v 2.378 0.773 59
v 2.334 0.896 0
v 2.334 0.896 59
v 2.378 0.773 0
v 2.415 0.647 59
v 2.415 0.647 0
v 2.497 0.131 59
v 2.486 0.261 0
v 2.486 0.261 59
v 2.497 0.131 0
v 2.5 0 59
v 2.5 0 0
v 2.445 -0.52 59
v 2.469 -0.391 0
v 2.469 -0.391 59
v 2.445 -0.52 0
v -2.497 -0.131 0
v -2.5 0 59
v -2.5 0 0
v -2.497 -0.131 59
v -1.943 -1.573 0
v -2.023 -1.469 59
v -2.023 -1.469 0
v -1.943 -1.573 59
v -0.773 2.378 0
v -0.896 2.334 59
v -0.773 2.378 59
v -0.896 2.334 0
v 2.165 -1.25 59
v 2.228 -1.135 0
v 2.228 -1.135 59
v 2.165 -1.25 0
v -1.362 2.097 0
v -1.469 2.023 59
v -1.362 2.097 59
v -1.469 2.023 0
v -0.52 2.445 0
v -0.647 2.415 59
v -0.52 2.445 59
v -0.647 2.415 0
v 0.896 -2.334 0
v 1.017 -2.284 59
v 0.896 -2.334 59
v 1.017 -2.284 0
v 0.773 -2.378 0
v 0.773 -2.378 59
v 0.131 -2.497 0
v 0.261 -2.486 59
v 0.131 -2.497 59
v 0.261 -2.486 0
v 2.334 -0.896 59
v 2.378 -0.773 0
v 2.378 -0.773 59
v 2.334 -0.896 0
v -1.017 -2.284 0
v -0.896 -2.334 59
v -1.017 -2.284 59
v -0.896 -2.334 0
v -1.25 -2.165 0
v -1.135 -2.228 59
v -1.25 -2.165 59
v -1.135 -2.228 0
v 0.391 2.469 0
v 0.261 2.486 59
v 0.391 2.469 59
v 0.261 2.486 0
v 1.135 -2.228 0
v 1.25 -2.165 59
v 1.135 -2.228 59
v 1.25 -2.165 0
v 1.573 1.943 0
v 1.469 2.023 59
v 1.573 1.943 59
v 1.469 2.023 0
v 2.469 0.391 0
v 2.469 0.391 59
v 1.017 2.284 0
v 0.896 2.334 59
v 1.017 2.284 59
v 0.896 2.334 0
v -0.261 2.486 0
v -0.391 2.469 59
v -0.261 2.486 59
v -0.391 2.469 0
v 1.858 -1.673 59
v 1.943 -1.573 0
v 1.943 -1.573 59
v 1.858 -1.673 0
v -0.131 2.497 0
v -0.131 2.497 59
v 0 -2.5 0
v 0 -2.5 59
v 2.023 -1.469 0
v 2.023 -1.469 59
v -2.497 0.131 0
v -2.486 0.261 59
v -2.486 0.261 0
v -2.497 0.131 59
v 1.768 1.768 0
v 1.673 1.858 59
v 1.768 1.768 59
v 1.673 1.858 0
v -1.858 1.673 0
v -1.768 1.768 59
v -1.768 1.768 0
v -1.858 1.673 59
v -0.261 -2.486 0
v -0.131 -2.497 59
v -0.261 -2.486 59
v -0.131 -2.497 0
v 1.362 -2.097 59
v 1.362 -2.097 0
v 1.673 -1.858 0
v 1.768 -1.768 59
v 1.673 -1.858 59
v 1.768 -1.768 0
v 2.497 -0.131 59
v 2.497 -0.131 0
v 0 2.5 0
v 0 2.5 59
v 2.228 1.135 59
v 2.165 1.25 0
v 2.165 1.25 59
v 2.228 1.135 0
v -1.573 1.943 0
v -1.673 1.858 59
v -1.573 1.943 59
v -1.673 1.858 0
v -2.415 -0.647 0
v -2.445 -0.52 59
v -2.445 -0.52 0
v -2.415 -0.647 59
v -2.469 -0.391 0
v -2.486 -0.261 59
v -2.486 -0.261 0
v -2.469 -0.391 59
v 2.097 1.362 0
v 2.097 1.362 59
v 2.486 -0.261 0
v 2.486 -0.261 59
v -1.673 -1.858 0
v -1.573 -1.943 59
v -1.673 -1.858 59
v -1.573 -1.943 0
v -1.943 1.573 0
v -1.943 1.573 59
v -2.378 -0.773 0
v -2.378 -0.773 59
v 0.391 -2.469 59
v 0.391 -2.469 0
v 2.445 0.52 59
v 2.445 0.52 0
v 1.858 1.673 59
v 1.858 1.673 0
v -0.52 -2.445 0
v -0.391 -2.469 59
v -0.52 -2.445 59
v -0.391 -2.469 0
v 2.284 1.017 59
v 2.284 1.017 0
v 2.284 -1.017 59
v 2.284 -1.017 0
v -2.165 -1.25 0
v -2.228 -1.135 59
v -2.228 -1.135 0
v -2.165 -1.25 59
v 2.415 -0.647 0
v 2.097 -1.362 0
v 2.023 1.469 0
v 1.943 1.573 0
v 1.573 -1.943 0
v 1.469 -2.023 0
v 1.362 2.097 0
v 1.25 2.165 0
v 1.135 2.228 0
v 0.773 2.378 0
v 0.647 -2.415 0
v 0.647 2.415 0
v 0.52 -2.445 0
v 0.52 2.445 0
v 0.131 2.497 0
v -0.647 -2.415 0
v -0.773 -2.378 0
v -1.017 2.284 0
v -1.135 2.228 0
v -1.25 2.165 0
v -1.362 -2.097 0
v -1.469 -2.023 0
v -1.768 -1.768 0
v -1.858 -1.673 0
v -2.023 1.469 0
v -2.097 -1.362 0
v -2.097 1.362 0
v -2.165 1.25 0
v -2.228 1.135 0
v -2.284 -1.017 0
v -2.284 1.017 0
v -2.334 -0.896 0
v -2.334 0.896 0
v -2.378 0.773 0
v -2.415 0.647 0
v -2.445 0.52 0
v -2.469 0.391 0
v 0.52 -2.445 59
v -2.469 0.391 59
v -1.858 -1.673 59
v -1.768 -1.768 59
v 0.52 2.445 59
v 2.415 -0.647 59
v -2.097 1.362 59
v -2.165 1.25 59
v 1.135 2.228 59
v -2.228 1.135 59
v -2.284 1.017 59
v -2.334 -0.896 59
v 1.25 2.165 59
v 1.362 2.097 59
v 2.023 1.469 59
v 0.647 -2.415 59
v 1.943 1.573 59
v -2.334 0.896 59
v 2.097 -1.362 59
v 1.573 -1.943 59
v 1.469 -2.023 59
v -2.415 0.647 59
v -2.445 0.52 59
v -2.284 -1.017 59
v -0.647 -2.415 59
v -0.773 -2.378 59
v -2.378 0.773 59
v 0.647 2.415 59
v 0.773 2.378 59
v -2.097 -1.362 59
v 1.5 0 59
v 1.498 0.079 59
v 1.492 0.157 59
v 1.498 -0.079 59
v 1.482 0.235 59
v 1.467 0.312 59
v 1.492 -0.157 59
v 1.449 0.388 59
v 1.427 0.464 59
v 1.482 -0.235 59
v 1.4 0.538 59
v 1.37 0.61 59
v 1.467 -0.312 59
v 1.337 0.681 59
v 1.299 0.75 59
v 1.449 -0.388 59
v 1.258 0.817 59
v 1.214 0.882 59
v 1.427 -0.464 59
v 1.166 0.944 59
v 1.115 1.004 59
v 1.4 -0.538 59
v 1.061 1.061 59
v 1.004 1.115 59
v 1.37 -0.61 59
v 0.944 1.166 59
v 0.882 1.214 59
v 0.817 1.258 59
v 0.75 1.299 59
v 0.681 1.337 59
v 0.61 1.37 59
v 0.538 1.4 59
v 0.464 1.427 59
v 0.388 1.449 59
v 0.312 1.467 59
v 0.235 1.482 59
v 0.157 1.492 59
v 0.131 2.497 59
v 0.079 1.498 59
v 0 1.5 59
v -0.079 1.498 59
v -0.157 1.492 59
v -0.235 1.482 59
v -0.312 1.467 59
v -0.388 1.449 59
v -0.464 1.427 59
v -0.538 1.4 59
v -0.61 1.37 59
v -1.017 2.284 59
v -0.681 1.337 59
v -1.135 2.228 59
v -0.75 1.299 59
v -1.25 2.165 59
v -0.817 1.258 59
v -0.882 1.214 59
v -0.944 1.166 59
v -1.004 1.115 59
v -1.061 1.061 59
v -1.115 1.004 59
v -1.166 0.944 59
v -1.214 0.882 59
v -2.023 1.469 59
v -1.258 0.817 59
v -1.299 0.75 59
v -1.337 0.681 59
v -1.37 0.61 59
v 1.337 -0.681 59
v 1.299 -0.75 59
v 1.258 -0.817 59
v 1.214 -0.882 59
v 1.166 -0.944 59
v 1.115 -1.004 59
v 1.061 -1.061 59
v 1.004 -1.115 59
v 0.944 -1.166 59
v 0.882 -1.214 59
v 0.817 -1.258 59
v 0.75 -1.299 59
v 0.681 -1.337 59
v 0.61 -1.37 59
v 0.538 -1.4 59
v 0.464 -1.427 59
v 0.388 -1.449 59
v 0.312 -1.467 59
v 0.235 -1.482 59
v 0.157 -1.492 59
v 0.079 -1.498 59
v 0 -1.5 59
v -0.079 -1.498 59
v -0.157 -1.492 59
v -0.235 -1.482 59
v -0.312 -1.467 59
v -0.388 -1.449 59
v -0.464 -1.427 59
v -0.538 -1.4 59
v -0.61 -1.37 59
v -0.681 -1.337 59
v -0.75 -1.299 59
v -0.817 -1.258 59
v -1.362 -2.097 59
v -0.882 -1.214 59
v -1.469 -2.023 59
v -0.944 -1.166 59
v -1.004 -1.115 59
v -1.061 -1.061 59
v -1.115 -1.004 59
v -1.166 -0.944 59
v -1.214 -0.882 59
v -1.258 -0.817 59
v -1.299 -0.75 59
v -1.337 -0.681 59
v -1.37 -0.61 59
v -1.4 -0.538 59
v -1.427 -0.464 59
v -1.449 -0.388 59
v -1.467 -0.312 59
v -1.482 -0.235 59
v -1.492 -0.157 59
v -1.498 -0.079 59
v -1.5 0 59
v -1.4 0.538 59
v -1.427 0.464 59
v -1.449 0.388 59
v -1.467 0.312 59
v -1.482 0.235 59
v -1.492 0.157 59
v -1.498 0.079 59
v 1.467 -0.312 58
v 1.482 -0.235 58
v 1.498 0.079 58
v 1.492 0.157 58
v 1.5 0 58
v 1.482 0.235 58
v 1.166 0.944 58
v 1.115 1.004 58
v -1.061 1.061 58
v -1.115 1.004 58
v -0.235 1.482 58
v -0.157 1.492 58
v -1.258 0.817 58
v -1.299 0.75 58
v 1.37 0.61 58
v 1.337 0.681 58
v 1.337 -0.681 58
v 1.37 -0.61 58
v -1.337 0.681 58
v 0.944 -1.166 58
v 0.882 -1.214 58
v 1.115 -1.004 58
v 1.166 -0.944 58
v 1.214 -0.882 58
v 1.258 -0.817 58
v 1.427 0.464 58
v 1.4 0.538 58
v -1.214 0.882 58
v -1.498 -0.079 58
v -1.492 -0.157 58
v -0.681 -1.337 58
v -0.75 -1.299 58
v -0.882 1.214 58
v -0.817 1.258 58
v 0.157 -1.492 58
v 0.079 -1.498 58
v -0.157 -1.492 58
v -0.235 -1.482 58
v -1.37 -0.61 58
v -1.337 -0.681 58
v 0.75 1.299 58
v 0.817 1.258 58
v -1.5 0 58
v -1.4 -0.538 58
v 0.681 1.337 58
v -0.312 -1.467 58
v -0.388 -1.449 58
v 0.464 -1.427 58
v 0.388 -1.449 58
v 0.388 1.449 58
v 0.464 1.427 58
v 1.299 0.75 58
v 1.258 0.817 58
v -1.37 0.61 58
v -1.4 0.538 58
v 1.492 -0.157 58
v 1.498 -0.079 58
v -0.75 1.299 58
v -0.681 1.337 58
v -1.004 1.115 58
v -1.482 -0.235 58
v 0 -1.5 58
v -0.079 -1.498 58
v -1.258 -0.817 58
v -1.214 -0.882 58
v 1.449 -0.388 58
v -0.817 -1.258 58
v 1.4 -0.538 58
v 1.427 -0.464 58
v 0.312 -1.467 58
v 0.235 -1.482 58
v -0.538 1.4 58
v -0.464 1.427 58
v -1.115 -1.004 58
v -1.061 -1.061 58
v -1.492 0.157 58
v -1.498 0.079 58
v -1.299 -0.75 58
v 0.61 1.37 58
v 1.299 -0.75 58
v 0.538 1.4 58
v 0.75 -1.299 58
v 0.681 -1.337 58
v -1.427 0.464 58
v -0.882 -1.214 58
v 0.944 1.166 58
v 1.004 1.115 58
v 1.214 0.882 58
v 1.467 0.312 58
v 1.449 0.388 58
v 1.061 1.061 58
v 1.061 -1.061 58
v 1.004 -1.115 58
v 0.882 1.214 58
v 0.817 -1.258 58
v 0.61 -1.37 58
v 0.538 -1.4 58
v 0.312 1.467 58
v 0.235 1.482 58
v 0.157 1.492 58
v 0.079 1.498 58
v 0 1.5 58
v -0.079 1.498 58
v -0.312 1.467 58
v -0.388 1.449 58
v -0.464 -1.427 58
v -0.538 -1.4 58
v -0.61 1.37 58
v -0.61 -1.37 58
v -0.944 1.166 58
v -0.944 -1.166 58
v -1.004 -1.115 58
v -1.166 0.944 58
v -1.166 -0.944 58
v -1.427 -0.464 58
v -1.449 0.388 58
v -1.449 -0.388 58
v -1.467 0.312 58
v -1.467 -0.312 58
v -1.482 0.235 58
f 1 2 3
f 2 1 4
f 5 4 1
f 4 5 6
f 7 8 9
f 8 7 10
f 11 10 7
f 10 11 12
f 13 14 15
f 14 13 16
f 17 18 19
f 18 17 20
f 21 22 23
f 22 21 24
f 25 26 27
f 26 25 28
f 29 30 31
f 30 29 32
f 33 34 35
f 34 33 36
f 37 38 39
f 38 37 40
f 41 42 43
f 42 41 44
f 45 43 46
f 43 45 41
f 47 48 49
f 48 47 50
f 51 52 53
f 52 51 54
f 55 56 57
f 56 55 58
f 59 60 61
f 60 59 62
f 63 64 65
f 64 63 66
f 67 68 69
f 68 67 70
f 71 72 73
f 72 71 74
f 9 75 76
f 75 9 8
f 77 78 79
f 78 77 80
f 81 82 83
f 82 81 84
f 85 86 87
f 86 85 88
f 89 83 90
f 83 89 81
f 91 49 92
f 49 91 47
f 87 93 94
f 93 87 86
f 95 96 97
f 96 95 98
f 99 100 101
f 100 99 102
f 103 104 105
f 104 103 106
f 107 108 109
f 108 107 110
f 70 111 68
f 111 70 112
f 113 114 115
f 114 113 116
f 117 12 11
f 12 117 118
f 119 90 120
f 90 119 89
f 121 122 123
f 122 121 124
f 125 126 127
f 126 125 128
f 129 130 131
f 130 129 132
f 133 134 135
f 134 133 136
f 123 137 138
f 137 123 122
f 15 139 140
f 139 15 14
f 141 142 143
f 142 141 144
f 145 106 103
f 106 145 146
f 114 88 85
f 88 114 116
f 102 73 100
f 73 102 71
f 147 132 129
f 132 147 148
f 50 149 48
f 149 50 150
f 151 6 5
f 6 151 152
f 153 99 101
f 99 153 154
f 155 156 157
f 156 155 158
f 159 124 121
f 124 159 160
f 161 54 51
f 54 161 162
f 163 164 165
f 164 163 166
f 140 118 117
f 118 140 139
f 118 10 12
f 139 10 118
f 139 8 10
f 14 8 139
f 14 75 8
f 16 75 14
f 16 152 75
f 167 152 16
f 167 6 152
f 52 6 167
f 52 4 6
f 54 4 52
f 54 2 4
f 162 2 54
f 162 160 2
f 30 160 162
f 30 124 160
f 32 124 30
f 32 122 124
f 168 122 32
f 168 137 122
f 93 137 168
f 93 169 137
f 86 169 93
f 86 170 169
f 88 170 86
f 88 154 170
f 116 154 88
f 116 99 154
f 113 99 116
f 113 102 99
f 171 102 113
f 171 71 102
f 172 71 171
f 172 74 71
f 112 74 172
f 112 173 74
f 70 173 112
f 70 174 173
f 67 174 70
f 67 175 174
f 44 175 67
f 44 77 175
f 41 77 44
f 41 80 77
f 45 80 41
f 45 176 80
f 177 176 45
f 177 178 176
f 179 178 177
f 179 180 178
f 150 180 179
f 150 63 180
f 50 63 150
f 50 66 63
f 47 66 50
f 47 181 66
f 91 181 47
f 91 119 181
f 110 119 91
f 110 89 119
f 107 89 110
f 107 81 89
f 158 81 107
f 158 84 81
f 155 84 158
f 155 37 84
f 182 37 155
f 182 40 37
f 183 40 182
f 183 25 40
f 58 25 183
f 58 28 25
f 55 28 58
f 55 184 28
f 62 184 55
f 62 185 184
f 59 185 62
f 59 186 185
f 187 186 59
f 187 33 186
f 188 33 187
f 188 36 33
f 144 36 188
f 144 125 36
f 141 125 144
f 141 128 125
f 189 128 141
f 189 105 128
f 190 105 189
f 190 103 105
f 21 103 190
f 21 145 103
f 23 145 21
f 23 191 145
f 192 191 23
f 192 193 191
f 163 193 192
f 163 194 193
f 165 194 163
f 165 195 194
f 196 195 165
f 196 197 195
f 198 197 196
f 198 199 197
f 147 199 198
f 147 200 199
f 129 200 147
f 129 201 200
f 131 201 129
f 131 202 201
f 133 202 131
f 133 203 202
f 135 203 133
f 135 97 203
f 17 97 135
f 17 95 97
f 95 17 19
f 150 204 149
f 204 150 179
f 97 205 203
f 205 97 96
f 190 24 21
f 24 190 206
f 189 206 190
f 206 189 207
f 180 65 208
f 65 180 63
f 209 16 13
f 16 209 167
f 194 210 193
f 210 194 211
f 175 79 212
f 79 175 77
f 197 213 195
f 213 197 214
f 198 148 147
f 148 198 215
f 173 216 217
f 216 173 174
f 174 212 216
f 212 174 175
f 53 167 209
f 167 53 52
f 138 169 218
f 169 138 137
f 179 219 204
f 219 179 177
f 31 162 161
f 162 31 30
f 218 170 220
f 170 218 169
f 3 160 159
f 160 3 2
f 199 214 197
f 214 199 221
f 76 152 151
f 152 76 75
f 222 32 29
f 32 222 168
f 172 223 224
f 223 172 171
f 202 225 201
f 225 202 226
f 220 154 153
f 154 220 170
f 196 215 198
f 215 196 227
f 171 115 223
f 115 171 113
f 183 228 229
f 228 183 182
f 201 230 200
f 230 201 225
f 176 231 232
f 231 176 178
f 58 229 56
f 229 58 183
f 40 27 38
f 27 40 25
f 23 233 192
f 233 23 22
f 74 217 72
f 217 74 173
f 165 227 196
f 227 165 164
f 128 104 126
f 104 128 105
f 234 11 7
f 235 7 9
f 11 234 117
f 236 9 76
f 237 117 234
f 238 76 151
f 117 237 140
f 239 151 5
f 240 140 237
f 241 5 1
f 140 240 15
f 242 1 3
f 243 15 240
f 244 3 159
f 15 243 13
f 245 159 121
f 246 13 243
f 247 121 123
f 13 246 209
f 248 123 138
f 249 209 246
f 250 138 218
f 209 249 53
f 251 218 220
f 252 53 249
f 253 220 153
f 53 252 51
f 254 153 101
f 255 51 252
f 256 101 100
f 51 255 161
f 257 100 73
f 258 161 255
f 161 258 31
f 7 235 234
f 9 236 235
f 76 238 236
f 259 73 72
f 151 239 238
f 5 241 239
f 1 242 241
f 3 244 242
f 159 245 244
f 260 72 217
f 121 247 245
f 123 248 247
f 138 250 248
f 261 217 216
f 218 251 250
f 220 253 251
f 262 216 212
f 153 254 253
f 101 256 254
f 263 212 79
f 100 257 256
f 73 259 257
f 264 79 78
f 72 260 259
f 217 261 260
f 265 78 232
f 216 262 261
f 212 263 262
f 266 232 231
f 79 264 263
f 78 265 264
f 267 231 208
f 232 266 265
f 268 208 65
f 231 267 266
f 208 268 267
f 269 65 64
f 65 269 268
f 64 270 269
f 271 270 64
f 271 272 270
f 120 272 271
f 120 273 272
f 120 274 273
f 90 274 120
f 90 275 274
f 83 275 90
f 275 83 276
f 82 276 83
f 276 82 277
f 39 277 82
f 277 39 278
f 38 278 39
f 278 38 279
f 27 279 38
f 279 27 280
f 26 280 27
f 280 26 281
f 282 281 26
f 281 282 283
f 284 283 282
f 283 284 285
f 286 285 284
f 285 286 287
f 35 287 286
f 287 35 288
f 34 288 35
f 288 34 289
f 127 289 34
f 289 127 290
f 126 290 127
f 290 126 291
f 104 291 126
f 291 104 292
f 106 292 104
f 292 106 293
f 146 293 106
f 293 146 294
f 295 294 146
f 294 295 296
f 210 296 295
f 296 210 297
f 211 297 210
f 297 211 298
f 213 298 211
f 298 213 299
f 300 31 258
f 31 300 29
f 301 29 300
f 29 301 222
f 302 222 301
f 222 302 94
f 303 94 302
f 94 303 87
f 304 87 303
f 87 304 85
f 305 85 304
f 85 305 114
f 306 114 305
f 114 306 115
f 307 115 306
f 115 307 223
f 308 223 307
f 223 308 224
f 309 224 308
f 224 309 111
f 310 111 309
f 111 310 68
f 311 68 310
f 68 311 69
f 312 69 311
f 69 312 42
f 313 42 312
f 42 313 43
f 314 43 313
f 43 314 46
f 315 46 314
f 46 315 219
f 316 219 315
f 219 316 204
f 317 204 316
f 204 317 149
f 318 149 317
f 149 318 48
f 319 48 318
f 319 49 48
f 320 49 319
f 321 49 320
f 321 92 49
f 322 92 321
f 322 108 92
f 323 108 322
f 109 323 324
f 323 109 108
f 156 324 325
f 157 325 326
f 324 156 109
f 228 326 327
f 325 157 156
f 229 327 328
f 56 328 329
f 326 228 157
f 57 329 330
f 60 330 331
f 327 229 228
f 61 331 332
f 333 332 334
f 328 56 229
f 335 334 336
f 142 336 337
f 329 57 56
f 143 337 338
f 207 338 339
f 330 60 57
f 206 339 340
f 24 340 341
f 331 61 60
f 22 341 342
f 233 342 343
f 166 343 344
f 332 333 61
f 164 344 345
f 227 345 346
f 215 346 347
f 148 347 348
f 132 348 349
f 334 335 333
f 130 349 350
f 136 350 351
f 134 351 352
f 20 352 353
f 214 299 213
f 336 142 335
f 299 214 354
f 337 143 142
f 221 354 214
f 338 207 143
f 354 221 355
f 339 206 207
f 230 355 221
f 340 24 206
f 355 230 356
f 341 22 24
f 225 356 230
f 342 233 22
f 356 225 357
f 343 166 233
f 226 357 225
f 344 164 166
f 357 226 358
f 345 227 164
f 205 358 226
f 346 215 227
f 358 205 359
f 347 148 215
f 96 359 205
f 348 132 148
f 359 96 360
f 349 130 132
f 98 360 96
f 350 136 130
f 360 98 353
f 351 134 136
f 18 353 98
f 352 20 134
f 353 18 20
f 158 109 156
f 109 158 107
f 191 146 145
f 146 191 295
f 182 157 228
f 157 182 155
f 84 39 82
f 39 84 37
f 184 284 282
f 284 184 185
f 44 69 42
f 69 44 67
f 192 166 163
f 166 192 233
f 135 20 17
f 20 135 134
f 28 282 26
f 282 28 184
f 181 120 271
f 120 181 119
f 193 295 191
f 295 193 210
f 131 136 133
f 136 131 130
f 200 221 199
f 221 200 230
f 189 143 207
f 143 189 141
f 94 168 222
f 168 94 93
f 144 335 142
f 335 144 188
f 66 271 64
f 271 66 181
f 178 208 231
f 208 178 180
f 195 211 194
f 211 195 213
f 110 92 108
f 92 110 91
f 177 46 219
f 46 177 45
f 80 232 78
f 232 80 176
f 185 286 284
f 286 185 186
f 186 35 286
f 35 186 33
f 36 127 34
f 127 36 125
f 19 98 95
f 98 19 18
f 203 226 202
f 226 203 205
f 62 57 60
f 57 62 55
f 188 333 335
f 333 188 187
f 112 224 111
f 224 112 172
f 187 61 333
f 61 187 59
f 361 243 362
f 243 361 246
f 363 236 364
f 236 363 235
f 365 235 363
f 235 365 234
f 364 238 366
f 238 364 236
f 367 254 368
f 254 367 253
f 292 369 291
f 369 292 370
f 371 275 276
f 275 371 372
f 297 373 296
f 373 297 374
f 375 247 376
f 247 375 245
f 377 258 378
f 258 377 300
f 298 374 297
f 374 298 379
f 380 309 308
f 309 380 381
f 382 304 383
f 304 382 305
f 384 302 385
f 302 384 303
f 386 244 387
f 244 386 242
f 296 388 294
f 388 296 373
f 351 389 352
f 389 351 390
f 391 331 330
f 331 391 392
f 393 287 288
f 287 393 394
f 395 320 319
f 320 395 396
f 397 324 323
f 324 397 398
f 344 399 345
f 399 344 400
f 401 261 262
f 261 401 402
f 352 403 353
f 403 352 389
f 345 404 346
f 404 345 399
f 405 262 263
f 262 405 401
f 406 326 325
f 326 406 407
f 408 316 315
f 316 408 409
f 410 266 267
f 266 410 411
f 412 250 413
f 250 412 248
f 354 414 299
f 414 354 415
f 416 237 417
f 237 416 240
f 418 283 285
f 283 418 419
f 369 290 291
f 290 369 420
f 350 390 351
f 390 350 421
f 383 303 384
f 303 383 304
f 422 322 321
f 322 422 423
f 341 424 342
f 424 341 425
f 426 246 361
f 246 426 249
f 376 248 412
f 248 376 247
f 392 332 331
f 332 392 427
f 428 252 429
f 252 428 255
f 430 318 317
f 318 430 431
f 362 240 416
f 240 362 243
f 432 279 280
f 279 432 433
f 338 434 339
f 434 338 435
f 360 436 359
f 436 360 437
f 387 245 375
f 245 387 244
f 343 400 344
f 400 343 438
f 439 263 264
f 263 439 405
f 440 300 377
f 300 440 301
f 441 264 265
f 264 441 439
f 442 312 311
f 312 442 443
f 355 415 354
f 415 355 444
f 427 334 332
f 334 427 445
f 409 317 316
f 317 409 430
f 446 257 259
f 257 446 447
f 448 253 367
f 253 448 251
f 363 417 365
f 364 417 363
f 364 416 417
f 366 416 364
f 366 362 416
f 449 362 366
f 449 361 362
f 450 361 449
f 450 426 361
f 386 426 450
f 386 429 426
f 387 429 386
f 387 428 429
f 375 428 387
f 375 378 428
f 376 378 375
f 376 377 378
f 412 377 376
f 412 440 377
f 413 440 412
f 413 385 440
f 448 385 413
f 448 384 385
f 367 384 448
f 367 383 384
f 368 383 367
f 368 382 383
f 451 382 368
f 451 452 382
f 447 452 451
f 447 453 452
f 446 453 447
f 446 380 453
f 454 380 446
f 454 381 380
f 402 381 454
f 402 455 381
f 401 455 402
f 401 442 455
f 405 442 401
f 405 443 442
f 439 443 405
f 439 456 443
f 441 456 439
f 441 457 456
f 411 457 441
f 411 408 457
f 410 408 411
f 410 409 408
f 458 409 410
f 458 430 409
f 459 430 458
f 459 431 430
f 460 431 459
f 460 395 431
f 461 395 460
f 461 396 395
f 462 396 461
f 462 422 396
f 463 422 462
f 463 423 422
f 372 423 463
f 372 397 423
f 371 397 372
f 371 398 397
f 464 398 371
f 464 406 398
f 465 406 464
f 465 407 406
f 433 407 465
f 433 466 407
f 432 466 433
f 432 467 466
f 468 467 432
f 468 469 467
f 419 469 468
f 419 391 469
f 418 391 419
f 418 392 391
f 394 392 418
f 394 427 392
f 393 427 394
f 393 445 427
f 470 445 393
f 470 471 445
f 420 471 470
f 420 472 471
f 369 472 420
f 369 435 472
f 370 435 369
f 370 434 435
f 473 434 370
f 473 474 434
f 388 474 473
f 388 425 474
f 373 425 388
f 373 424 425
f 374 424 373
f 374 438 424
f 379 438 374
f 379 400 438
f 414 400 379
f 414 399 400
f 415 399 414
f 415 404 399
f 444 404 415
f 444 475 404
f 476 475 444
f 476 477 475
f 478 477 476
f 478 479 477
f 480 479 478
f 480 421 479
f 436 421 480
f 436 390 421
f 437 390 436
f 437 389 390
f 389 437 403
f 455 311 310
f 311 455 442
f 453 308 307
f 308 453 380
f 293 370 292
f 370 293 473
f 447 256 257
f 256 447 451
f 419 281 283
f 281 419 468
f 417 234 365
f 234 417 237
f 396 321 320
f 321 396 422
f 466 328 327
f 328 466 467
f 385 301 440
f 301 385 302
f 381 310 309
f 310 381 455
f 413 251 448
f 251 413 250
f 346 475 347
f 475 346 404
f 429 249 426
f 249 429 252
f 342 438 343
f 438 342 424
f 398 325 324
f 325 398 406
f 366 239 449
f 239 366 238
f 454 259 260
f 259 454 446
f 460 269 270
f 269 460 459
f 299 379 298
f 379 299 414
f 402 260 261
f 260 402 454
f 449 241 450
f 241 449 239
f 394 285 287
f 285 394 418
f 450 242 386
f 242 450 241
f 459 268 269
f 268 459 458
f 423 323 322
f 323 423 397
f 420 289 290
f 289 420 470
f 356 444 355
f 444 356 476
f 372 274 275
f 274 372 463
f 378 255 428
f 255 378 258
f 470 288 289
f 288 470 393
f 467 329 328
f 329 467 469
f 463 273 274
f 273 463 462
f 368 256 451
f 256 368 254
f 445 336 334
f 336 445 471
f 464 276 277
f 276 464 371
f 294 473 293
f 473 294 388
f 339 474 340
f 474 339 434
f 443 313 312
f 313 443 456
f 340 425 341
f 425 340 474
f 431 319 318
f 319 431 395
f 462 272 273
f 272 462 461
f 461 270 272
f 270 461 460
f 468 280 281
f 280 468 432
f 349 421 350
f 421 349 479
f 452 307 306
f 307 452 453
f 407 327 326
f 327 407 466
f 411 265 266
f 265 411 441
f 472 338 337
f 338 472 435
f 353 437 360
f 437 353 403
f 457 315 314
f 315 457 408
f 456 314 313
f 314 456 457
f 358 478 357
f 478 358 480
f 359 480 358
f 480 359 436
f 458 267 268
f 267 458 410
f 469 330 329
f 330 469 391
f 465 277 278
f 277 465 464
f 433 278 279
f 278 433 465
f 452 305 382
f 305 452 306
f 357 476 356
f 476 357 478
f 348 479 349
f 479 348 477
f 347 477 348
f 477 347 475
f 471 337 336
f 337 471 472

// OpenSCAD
// file: ../../lib/sail_shaft.scad
// ==========================================================================
//  Turtle Body -- sail shaft: uniform round centre axle  (lib module)
// --------------------------------------------------------------------------
//  TB-08: one uniform round bar top to bottom -- no hex section. The lower
//  (round_inside_cap) portion bears/free-spins in the cap's bore; the upper
//  portion continues on up through the cage hub and the top sail bar's own
//  hole with a light running clearance (p_axle_shaft_hole_d()) and is
//  locked to the ROTATING cage by a single radial M3 set screw through the
//  cage hub (see lib/control_cage.scad) instead of a shaped interference
//  fit. Magnet recess opens at the round/lower end for an AS5600 sensing
//  magnet. See CLAUDE.md s9.
//
//  TB-04: derived to the resolved 5 mm cap roof (TB-03). round_inside_cap
//  spans roof underside -> round end, 30 mm, INCLUDING the boss -- do not
//  add the boss again -- + the 5 mm roof + 1 mm proud, so the shaft's
//  lower end still sits 1 mm above the cap's outer face and the overall
//  shaft is 59 mm.
//
//  Definitions only. Geometry is emitted by sail_shaft().
// ==========================================================================

use <params.scad>

module sail_shaft(round_d          = p_axle_round_d(),
                  round_inside_cap = p_axle_round_inside_cap(),  // 30, roof underside -> round end
                  round_ext        = p_axle_round_ext(),         // 1, proud of the cap face
                  cap_roof_t       = p_cap_roof_t(),              // 5 (TB-03)
                  upper_len        = p_axle_upper_len(),          // 23, continues up through cage + sail bar
                  magnet           = true,
                  magnet_d         = p_magnet_d(),
                  magnet_t         = p_magnet_t(),
                  fn               = undef) {
    nn        = fn == undef ? p_fn_plastic() : fn;
    round_len = round_inside_cap + cap_roof_t + round_ext;
    total_len = upper_len + round_len;

    // ---- interface asserts (inputs from the shared contract) ----
    assert(round_d > 0 && round_d < p_cap_axle_bore_d(),
           "sail_shaft: shaft must clear the cap bore.");
    assert(round_d < p_axle_shaft_hole_d(),
           "sail_shaft: shaft must clear the cage hub / sail bar running hole.");
    assert(round_inside_cap > 0 && cap_roof_t > 0 && round_ext >= 0 && upper_len > 0);
    assert(round_inside_cap > p_cap_boss_depth(),
           "sail_shaft: shaft must pass the boss.");
    assert(round_inside_cap < p_cap_insert_len(),
           "sail_shaft: keep the lower end inside the cap's open insert rim.");
    assert(upper_len + round_ext >
           p_cage_bearing_d() / 2 + p_cage_roof_t() + p_top_crossbar_t(),
           "sail_shaft: shaft must reach through the cage roof and sail bar.");
    assert(!magnet || (magnet_d > 0 && magnet_d < round_d
           && magnet_t > 0 && magnet_t < round_inside_cap));

    $fn = nn;
    difference() {
        cylinder(d = round_d, h = total_len);
        if (magnet)
            translate([0, 0, total_len - magnet_t])
                cylinder(d = magnet_d, h = magnet_t + p_eps());
    }

    echo("SAIL SHAFT: total / round-in-cap / upper length = ", total_len, round_len, upper_len);
    echo("SAIL SHAFT: diameter (uniform, no hex) = ", round_d);
}

// Print pose: either end can sit flat on the bed (a bare cylinder); modelled
// with the upper (cage-lock) end at Z=0 and the magnet opening up, matching
// the as-modelled orientation used before TB-08 -- no reseat module needed.
// main file
/*
 Hope Turtle — uniform round centre sail shaft. Units: mm. License: CERN-OHL-S-2.0.
 TB-08: one uniform round bar top to bottom, no hex section. Free-spins in
 the cap bore; passes with a light running clearance through the cage hub
 and the top sail bar's own hole; locks to the rotating cage with a single
 M3 set screw through the cage hub (see Bottle_Control_Cage.scad).
 Upper end on Z=0 for printing; the magnet recess opens upward.
 v6.4.0: the real shaft is an Ø5 steel rod; this file now just gives its
 cut length and magnet-recess position. Round-in-cap section = 30 mm inside the cavity (incl. boss) + 5 mm cap roof
 (TB-03) + 1 mm proud. Overall length 59 mm.

 SOURCE FILE — geometry lives in lib/sail_shaft.scad + lib/params.scad.
 The committed self-contained file is generated by build/build.py.
*/

/* [Shaft] */
shaft_diameter = 5;  // v6.4.0: Ø5 steel rod (was an Ø8 printed PLA shaft) -- this model is now
                     // the cut-length / magnet-recess reference, not a print
round_length_inside_cap = 30; // roof underside -> lower end, INCLUDING the boss
round_extension_above_cap = 1;
upper_length = 23; // continues up through the cage hub + sail bar

/* [Magnet recess] */
magnet_recess_enabled = true;
magnet_diameter = 3;
magnet_thickness = 1;

/* [Render] */
fn = 120; // [48:8:240]

use <../../lib/sail_shaft.scad>

color([0.74, 0.77, 0.79])
sail_shaft(round_d          = shaft_diameter,
           round_inside_cap = round_length_inside_cap,
           round_ext        = round_extension_above_cap,
           upper_len        = upper_length,
           magnet           = magnet_recess_enabled,
           magnet_d         = magnet_diameter,
           magnet_t         = magnet_thickness,
           fn               = fn);
